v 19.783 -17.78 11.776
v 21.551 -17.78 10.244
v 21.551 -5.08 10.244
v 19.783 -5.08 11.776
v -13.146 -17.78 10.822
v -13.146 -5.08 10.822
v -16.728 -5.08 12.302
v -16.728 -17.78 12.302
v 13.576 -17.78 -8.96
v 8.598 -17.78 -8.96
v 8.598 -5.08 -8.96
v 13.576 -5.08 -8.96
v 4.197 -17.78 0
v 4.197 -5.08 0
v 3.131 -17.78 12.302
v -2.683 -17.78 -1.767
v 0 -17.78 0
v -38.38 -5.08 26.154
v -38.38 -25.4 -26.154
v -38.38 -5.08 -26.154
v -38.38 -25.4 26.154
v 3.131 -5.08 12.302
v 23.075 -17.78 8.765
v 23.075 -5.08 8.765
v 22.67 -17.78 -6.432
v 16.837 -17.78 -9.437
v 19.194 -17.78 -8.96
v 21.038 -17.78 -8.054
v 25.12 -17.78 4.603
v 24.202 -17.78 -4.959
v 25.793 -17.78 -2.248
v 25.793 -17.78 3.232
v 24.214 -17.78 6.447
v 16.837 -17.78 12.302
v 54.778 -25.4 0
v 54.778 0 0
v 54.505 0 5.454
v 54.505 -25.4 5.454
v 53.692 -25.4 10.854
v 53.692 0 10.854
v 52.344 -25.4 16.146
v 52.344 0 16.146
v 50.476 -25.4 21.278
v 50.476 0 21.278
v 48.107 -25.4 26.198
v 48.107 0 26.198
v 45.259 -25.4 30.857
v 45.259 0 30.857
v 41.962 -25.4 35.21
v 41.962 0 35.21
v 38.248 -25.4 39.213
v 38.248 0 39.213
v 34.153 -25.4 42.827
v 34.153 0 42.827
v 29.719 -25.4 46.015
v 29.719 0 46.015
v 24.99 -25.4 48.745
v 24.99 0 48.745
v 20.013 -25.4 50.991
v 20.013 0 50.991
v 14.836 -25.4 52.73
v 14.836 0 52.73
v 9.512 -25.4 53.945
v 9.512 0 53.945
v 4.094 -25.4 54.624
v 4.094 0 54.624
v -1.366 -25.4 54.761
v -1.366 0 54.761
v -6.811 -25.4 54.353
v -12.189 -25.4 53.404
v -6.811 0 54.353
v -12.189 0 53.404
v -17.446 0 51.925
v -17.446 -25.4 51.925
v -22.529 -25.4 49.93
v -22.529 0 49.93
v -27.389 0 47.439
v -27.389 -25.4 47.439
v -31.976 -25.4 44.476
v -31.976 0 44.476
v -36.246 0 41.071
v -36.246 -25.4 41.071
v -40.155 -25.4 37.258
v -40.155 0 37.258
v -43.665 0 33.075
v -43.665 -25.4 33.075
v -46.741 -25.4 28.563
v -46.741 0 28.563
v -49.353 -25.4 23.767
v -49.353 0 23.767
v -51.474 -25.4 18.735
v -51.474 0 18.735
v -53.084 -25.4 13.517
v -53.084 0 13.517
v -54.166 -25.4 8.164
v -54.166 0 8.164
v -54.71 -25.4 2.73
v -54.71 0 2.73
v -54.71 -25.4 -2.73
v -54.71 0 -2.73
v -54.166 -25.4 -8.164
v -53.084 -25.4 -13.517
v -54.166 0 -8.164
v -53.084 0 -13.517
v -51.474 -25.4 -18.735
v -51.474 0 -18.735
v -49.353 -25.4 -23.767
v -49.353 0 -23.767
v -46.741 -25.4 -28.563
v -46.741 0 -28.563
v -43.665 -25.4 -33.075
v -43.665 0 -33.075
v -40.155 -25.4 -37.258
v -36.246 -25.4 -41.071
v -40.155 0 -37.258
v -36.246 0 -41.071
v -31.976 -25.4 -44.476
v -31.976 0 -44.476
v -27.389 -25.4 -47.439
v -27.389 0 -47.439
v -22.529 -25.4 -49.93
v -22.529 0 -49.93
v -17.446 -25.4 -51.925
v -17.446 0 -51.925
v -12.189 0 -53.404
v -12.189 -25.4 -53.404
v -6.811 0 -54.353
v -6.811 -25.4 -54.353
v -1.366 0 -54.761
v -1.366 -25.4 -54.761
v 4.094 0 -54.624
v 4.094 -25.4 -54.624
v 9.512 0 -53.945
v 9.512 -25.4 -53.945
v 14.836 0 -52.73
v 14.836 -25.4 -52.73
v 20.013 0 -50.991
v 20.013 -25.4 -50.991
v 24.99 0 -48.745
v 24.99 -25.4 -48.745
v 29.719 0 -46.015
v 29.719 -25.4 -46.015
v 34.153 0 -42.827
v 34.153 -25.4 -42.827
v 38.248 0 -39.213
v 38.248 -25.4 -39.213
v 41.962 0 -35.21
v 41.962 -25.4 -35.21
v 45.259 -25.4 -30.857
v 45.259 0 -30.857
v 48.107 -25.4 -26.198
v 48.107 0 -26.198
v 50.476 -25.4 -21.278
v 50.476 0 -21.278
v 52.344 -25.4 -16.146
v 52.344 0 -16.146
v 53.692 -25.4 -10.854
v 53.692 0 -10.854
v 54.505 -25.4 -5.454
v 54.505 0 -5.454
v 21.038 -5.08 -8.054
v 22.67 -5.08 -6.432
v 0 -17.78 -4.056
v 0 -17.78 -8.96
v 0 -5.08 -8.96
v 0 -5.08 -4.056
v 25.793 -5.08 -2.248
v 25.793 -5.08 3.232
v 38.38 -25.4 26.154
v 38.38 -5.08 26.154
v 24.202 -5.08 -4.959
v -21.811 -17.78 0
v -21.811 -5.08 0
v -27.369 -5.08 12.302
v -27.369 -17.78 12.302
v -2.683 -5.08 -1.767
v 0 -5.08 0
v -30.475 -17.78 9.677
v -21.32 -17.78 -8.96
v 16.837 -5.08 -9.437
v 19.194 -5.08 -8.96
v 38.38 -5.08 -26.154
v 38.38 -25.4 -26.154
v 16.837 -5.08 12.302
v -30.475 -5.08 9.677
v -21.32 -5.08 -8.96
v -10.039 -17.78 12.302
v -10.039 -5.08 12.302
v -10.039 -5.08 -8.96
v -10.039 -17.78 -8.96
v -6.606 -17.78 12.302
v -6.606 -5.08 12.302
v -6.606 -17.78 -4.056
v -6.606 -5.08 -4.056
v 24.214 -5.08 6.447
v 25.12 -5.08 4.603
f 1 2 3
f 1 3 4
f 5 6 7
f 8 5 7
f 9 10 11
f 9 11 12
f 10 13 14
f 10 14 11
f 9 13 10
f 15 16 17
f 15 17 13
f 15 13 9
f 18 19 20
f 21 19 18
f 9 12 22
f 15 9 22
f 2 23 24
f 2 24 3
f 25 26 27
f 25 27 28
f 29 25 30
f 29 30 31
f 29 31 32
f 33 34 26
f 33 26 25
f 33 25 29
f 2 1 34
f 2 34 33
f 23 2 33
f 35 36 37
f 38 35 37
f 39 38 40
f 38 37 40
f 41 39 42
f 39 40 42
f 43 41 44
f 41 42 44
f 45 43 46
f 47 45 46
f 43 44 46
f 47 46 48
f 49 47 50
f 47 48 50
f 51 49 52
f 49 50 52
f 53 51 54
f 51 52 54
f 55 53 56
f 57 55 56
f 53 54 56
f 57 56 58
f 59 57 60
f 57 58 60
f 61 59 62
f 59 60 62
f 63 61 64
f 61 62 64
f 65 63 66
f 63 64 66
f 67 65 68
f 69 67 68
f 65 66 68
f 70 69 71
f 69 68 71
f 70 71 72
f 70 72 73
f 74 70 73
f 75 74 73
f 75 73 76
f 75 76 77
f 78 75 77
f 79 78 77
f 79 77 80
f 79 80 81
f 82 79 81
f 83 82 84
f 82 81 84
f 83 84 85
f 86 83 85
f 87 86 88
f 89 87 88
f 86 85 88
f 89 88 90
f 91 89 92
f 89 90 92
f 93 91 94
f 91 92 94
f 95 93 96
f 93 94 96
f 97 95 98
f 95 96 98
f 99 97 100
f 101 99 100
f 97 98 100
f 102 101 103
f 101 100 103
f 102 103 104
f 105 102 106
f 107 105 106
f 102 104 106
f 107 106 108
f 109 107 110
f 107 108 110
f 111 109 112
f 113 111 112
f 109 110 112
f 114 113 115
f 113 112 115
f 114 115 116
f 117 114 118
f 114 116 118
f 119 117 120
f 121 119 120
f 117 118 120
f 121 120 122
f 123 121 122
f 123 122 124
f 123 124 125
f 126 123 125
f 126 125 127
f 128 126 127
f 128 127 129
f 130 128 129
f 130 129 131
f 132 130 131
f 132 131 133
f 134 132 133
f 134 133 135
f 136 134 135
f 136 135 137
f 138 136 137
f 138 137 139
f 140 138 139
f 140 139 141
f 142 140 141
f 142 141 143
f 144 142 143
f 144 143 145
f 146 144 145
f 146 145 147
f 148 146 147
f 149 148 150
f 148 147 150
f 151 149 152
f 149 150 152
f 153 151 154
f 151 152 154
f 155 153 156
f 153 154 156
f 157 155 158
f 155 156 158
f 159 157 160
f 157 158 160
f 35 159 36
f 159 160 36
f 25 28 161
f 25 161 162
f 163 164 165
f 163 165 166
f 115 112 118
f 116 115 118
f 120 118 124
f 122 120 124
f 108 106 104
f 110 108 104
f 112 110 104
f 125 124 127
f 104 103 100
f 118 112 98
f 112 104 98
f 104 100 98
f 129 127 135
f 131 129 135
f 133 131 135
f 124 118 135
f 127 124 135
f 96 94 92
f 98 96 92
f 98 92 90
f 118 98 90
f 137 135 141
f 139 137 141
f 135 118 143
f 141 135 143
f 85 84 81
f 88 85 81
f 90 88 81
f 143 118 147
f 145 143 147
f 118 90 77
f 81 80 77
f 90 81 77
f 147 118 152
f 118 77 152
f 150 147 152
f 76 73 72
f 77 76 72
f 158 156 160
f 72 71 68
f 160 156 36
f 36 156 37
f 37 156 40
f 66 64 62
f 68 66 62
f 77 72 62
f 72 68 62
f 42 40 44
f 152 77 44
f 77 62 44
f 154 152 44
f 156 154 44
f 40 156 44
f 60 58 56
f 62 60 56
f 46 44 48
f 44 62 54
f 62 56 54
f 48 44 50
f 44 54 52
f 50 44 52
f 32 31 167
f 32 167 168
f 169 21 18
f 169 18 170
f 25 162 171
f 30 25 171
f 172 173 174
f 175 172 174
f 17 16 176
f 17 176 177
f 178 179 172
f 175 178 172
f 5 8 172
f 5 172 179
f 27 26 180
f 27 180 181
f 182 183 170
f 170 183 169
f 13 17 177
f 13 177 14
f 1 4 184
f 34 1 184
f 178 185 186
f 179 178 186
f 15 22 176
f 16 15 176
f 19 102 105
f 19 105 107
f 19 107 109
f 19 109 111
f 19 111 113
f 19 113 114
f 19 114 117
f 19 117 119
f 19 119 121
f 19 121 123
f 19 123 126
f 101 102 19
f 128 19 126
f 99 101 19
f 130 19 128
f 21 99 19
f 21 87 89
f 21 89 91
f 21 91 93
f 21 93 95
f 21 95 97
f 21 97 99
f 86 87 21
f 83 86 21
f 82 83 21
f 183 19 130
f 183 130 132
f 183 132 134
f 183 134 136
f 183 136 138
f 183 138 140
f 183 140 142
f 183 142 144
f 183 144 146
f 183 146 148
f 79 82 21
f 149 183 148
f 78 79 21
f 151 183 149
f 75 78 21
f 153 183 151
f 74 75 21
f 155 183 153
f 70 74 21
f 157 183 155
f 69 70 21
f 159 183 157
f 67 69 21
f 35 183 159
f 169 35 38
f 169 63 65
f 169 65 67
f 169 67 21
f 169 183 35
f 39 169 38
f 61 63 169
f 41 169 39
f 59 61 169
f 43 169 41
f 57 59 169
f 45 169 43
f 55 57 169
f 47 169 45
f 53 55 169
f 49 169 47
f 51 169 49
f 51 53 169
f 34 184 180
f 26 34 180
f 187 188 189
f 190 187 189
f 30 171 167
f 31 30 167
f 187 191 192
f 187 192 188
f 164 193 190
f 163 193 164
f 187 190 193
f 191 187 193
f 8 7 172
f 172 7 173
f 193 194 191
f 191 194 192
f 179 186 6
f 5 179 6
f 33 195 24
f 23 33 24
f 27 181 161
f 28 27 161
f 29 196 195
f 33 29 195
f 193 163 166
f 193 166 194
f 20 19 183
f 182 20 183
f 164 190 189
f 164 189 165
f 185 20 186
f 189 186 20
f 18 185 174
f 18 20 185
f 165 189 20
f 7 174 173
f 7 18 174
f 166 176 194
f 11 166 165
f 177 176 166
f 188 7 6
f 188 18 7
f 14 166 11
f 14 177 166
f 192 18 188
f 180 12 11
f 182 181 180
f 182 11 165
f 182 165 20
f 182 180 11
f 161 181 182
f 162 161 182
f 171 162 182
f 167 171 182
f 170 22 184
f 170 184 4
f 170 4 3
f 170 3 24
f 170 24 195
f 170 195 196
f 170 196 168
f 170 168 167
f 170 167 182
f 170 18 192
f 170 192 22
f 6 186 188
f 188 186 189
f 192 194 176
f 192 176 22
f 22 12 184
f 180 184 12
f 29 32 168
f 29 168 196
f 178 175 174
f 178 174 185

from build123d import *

# Parameters (mm, degrees)
F0_R     = 54.777634
F1_DEPTH = 25.4
F2_W     = 76.760076
F2_H     = 52.30828
F3_DEPTH = 20.32
F5_DEPTH = 12.7


with BuildPart() as f1:
    # F0 (on Front) → F1 (new body)
    with BuildSketch(Plane.XZ):
        Circle(F0_R)
    extrude(amount=F1_DEPTH)

    # F2 (on face) → F3 (cut)
    with BuildSketch(Plane.XZ.offset(25.4)):
        Rectangle(F2_W, F2_H)
    extrude(amount=-F3_DEPTH, mode=Mode.SUBTRACT)

    # F4 (on face) → F5 (join)
    with BuildSketch(Plane.XZ.offset(5.08)):
        Polygon((19.782942, 11.775956), (16.836673, 12.301875), (16.836673, -9.437174), (19.193688, -8.960415), (21.037921, -8.054476), (22.670284, -6.43198), (24.202343, -4.958846), (25.793329, -2.248279), (25.793329, 0.697988), (25.793329, 3.231779), (25.119537, 4.603426), (24.213784, 6.44728), (23.075252, 8.765006), (21.550702, 10.243896), align=None)
        Polygon((19.193688, -4.840995), (18.66336, 6.413748), (23.259537, 0.639063), align=None, mode=Mode.SUBTRACT)
        Polygon((3.131037, 12.301875), (-2.682529, -1.766953), (0, 0), (4.196519, 0), (8.598126, -8.960415), (13.575672, -8.960415), align=None)
        Polygon((5.098887, 2.528751), (1.241177, 2.483729), (3.013781, 6.77343), align=None, mode=Mode.SUBTRACT)
        Polygon((23.259537, 0.639063), (18.66336, 6.413748), (19.193688, -4.840995), align=None)
        Polygon((-27.369183, 12.301875), (-30.475451, 9.677191), (-21.320134, -8.960415), (-13.145746, 10.821605), (-16.727999, 12.301875), (-21.811419, 0), align=None)
        Polygon((-6.606236, 12.301875), (-10.039479, 12.301875), (-10.039479, -8.960415), (0, -8.960415), (0, -4.055782), (-6.606236, -4.055782), align=None)
        Polygon((3.013781, 6.77343), (1.241177, 2.483729), (5.098887, 2.528751), align=None)
    extrude(amount=F5_DEPTH)


solid = f1.part
